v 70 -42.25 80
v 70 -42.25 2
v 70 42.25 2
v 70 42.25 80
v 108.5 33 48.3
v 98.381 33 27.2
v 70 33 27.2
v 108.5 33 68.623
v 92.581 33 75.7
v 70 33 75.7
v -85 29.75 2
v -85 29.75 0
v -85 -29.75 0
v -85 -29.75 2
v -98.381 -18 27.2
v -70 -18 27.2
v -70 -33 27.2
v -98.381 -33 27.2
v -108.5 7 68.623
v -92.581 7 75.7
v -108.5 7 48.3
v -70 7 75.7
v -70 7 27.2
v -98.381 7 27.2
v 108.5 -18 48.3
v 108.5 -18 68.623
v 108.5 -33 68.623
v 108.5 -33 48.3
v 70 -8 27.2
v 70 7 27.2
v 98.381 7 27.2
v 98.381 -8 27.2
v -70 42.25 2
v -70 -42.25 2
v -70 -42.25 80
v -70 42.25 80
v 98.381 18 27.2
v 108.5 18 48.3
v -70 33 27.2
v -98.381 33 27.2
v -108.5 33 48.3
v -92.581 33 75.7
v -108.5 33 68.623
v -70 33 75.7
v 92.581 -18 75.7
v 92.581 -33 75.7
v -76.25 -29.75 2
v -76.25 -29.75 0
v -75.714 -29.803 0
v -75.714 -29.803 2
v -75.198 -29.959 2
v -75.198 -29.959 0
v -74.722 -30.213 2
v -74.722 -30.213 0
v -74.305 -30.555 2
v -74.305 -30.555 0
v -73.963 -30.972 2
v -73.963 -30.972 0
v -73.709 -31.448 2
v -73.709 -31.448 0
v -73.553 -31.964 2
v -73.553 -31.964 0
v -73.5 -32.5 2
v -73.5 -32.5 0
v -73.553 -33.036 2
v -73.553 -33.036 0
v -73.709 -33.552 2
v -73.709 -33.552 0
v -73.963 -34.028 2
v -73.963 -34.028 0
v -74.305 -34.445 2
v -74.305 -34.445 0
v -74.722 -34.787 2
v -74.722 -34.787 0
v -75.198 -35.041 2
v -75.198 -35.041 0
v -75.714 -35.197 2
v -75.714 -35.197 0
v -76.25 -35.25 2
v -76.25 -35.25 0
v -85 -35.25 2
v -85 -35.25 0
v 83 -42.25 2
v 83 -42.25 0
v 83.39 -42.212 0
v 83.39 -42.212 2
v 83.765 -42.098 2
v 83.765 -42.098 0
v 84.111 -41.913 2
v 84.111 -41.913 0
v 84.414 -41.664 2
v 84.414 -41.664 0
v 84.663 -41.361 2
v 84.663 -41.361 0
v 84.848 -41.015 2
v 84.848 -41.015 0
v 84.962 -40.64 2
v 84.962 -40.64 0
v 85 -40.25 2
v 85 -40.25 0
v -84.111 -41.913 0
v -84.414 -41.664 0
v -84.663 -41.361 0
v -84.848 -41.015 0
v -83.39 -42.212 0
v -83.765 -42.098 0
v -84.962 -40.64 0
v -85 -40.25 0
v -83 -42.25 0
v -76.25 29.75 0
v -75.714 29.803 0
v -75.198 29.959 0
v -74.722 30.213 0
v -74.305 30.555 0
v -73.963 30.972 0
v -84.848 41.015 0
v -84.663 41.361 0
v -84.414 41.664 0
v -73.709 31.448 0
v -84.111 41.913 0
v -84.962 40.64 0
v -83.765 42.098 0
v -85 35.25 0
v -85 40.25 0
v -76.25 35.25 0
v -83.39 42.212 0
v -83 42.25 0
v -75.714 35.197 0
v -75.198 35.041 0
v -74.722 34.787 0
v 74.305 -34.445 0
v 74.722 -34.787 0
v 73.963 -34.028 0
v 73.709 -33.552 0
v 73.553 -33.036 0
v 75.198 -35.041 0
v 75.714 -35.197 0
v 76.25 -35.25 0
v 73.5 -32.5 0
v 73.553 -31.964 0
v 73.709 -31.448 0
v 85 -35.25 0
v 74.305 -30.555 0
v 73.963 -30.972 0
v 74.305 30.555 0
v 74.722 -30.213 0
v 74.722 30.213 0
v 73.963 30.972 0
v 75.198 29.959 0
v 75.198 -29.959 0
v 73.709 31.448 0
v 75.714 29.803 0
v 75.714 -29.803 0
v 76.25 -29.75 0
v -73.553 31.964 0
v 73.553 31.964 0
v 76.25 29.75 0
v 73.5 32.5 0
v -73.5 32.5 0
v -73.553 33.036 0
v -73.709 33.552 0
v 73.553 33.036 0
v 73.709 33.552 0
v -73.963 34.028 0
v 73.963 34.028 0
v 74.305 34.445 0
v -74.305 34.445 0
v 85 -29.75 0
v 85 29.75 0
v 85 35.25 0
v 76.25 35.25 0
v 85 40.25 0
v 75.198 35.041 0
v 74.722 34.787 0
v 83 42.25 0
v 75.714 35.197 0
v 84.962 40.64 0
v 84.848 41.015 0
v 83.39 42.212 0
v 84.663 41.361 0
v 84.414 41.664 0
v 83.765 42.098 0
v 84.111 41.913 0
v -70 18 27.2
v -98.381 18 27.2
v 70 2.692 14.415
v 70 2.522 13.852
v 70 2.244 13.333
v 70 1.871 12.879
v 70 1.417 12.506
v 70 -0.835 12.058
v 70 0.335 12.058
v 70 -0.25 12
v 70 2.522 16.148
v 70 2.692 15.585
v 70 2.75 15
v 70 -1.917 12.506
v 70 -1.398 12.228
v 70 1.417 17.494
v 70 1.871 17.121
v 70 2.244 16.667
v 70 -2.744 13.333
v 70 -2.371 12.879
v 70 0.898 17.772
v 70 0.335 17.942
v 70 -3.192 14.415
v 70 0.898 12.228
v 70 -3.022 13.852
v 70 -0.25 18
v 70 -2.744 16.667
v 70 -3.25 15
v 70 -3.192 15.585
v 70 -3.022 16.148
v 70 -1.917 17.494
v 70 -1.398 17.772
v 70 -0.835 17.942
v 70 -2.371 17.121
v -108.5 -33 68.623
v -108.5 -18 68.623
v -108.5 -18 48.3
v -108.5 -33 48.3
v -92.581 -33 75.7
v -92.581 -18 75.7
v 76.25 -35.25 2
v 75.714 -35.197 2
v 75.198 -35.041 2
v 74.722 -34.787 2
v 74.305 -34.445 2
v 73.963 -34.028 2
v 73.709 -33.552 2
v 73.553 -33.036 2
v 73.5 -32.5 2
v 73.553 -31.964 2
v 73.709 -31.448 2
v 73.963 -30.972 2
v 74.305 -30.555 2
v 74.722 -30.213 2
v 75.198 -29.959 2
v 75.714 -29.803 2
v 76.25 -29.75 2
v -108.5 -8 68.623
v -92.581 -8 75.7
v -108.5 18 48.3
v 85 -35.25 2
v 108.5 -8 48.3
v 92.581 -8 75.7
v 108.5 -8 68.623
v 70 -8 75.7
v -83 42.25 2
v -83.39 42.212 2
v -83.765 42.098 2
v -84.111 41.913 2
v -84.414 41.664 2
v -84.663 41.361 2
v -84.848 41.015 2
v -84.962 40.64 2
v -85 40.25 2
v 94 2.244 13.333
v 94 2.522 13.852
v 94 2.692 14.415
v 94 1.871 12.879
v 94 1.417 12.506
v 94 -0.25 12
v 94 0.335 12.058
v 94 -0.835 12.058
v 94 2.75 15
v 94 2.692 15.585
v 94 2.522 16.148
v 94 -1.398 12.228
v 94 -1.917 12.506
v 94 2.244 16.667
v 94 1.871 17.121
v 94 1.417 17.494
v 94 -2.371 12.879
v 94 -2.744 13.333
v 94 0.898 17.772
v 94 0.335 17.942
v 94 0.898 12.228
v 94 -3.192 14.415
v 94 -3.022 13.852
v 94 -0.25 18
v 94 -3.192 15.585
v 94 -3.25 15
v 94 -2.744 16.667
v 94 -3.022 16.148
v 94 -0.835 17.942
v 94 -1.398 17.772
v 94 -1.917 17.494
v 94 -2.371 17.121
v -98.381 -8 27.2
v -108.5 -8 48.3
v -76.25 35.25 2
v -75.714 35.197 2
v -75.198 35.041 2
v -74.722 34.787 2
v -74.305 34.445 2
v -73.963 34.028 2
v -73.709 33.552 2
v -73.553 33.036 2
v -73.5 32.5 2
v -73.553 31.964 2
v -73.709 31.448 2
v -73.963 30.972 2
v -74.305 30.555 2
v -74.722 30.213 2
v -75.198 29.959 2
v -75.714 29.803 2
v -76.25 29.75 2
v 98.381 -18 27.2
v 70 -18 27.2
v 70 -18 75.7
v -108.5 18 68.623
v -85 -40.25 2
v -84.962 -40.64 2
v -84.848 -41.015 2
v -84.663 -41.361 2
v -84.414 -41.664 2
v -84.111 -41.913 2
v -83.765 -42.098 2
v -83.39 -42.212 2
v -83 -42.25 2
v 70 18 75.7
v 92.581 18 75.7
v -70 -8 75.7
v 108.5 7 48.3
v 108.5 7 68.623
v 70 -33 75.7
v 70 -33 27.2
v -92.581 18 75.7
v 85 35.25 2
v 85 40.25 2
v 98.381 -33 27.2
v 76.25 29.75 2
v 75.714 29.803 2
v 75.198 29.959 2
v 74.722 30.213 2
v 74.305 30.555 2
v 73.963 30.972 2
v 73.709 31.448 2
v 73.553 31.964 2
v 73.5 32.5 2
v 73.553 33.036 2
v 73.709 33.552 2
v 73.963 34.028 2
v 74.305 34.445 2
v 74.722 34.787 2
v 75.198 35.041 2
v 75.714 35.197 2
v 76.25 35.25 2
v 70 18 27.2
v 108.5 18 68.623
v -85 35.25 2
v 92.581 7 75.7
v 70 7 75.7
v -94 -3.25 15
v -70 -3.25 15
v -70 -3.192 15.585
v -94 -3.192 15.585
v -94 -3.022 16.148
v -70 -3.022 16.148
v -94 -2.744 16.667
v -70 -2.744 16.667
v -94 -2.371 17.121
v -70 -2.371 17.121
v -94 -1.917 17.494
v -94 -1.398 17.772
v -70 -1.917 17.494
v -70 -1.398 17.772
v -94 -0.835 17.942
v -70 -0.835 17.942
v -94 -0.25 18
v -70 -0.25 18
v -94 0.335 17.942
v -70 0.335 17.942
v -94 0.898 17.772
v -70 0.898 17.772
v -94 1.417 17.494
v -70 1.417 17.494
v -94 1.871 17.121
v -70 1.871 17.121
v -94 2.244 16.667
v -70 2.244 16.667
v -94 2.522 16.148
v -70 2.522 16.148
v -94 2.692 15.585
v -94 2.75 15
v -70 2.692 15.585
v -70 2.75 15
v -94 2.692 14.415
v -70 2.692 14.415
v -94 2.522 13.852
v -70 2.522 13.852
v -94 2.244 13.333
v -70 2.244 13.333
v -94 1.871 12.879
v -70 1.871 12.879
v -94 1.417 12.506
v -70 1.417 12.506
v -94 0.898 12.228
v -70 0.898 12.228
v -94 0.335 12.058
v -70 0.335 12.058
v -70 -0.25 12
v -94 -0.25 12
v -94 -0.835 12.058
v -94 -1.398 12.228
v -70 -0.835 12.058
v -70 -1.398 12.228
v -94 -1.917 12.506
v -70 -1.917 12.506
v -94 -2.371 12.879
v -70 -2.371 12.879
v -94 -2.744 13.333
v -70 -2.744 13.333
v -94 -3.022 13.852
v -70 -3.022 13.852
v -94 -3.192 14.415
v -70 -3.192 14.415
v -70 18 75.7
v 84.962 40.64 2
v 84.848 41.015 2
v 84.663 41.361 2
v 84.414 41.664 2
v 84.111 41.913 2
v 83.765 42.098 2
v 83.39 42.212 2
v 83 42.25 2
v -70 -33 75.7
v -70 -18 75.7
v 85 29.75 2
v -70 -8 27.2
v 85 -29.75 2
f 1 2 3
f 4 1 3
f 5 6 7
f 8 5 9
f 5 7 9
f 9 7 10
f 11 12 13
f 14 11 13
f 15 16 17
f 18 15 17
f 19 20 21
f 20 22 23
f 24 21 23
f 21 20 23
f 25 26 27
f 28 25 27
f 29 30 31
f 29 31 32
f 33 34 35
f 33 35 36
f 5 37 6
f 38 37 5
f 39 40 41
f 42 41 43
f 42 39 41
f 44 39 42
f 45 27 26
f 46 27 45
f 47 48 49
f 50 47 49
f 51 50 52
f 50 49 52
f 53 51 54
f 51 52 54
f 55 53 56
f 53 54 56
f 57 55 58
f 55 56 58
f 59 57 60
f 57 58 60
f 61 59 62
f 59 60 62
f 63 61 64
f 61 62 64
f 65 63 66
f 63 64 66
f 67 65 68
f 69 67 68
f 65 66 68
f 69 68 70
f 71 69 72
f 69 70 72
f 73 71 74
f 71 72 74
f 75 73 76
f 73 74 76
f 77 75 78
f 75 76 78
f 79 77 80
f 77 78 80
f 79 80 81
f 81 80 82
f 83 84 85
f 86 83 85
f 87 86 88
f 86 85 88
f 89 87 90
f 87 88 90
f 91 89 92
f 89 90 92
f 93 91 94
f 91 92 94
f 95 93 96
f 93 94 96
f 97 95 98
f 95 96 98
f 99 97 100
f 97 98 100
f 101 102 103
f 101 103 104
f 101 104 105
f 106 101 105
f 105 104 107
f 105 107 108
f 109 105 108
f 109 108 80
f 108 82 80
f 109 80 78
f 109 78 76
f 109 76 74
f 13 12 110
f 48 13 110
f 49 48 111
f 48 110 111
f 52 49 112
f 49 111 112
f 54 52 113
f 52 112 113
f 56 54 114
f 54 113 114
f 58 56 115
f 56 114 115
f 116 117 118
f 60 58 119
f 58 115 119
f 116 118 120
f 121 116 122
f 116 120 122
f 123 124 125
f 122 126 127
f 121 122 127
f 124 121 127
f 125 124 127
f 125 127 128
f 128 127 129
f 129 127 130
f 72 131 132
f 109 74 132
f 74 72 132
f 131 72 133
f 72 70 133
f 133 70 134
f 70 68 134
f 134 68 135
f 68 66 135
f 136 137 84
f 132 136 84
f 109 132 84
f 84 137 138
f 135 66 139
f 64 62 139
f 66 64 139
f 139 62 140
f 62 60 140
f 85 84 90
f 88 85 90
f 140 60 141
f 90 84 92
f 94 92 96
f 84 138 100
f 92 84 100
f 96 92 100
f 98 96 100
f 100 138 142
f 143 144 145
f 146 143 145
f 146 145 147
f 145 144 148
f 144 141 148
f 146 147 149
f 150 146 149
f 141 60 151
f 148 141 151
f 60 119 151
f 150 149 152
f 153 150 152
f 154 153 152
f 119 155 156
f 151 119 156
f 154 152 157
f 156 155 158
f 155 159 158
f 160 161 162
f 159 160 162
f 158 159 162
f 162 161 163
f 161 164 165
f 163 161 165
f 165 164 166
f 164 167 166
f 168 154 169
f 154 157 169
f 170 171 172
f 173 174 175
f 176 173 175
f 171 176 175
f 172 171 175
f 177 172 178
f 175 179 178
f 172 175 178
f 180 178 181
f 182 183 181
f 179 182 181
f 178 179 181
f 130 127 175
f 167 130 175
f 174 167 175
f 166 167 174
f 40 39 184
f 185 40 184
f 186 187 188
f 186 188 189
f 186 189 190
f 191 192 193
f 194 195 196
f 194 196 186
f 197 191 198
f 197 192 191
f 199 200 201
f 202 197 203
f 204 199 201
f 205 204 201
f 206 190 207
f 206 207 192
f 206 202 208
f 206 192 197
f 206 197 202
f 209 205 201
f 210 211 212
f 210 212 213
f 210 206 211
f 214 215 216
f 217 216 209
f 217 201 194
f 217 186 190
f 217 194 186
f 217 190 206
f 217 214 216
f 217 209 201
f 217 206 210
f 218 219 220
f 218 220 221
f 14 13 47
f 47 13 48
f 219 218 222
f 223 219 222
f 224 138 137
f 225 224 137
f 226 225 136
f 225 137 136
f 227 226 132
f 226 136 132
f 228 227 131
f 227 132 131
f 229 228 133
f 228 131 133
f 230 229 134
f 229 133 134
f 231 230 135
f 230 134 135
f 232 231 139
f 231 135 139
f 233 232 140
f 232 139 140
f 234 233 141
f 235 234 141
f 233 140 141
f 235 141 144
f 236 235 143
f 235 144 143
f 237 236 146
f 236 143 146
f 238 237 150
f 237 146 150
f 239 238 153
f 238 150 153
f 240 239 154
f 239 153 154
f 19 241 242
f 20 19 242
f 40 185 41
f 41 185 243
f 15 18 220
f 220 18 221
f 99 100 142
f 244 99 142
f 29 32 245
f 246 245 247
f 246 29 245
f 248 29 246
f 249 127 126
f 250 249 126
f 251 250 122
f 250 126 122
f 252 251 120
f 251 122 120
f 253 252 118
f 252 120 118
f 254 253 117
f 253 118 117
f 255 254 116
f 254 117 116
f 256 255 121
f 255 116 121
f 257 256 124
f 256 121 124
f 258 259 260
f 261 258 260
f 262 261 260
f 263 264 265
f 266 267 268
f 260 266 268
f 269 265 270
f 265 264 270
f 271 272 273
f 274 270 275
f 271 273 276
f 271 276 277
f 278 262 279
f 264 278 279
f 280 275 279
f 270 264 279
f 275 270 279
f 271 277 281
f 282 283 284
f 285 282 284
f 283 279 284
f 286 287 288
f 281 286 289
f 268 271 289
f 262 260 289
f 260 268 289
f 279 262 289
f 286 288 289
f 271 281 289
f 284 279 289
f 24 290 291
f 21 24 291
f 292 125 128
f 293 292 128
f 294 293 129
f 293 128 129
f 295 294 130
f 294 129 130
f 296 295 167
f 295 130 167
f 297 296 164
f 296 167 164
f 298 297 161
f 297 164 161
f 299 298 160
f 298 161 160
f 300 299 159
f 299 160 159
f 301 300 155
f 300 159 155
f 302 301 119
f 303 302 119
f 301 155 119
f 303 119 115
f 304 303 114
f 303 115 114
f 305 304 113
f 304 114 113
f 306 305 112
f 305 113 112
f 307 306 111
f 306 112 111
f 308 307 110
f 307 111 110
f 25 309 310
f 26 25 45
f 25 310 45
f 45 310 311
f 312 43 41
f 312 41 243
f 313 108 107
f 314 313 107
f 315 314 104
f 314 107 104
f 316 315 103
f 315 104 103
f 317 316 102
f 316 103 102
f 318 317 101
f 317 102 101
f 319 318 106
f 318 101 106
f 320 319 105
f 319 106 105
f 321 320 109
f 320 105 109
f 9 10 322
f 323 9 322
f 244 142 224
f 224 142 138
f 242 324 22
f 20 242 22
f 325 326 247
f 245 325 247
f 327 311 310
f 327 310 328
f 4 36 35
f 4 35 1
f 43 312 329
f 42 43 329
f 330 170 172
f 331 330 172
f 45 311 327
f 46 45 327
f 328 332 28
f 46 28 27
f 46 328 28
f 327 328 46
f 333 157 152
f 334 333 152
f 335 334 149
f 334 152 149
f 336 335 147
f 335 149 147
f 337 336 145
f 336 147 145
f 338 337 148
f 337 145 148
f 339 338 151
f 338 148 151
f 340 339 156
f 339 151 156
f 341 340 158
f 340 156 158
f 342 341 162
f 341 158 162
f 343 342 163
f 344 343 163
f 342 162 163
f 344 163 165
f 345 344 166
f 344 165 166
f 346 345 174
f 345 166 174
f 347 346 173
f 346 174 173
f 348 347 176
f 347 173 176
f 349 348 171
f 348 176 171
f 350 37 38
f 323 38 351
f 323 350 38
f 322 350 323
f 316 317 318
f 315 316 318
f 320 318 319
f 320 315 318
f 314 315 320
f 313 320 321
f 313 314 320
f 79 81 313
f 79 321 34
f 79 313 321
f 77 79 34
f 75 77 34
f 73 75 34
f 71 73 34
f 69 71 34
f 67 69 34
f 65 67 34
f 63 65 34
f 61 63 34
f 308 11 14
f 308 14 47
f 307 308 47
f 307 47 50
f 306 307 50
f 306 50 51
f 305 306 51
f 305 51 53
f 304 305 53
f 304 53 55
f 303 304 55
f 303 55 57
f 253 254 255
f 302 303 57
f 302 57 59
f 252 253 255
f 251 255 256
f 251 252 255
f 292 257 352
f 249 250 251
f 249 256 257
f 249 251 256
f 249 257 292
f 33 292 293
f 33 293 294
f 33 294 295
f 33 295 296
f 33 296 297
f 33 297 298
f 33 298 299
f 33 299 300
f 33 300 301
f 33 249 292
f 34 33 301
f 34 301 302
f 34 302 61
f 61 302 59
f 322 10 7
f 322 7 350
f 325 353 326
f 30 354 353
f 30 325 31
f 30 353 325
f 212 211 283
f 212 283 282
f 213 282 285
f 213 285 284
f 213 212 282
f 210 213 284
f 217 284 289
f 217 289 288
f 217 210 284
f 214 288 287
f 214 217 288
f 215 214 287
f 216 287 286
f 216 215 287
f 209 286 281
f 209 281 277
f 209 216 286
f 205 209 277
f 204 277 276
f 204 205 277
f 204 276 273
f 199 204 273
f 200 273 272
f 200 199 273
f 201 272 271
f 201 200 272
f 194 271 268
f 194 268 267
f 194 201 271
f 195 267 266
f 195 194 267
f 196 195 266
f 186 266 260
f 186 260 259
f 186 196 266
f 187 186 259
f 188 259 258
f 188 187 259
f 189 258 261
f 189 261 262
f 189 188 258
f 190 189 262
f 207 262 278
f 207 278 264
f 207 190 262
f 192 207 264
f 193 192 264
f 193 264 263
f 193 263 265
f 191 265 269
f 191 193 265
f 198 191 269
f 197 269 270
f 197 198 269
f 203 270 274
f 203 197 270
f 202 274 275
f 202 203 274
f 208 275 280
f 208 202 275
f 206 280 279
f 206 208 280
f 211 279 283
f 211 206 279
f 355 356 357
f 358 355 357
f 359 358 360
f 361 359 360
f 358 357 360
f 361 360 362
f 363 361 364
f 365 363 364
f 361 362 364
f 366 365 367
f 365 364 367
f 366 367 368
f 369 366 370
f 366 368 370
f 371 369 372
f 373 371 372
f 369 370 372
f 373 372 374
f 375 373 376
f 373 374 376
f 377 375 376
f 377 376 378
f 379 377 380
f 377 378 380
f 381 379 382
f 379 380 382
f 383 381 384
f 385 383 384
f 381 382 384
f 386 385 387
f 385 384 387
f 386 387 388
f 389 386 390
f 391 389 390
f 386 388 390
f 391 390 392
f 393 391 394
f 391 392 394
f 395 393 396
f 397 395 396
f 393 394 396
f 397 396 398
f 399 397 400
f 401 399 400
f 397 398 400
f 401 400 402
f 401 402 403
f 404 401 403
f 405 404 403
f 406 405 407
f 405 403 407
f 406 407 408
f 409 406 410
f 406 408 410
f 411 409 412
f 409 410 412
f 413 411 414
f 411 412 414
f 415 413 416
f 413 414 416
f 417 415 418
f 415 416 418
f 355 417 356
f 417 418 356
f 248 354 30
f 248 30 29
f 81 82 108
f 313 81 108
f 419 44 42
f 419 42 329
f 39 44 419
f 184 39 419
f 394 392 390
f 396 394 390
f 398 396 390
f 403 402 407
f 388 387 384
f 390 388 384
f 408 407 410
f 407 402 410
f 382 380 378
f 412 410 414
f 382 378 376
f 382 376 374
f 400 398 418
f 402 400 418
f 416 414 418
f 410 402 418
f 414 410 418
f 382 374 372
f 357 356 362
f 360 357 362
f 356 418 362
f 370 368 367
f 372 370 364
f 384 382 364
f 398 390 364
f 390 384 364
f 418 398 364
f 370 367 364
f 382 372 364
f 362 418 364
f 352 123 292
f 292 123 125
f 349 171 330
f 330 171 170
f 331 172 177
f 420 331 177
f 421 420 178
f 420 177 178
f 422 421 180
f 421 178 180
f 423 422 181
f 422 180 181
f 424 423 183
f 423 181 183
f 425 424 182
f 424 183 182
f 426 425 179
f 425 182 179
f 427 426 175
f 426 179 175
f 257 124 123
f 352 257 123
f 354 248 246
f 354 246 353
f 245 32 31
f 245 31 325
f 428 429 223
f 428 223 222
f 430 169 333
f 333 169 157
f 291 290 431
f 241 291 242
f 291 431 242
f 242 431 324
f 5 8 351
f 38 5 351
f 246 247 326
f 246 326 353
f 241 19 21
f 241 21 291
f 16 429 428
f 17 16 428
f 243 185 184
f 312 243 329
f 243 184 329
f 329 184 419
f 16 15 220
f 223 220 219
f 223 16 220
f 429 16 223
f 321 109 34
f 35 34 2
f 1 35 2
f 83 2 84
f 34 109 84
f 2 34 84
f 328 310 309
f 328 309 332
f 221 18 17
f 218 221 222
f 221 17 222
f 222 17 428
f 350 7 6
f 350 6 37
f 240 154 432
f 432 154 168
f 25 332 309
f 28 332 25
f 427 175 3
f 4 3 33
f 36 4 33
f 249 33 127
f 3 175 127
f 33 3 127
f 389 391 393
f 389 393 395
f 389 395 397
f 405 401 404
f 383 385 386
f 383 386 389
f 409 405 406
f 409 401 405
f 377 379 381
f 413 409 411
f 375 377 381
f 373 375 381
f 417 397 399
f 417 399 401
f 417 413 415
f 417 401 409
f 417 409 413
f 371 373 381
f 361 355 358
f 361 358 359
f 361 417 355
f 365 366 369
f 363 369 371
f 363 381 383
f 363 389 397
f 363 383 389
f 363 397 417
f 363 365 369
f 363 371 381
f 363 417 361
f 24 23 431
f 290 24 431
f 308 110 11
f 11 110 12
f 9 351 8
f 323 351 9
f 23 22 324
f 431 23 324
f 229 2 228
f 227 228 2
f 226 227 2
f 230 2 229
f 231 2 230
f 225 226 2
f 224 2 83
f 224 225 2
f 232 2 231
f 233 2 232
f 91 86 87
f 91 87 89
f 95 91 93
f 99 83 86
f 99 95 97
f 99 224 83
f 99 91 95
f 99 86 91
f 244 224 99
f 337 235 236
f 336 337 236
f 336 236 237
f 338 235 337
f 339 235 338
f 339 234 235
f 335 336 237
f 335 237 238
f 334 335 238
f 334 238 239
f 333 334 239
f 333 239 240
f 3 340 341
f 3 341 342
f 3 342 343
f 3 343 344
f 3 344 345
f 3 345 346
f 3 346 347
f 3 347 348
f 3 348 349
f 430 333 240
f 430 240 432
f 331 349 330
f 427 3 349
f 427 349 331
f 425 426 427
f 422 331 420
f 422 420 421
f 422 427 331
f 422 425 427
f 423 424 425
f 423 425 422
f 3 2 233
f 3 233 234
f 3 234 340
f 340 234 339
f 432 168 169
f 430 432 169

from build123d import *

# Parameters (mm, degrees)
F1_DEPTH = 2
F2_W     = 140
F2_H     = 84.5
F3_DEPTH = 78
F4_W     = 15
F4_H     = 48.5
F5_DEPTH = 38.5
F7_DEPTH = 200
F8_R     = 3
F9_DEPTH = 24


with BuildPart() as f1:
    # F0 (on Top) → F1 (new body)
    with BuildSketch(Plane.XY):
        with BuildLine():
            ThreePointArc((85, 40.25), (84.414214, 41.664214), (83, 42.25))
            Line((83, 42.25), (-83, 42.25))
            ThreePointArc((-83, 42.25), (-84.414214, 41.664214), (-85, 40.25))
            Line((-85, 40.25), (-85, 35.25))
            Line((-85, 35.25), (-76.25, 35.25))
            ThreePointArc((-76.25, 35.25), (-73.5, 32.5), (-76.25, 29.75))
            Line((-76.25, 29.75), (-85, 29.75))
            Line((-85, 29.75), (-85, -29.75))
            Line((-85, -29.75), (-76.25, -29.75))
            ThreePointArc((-76.25, -29.75), (-73.5, -32.5), (-76.25, -35.25))
            Line((-76.25, -35.25), (-85, -35.25))
            Line((-85, -35.25), (-85, -40.25))
            ThreePointArc((-85, -40.25), (-84.414214, -41.664214), (-83, -42.25))
            Line((-83, -42.25), (83, -42.25))
            ThreePointArc((83, -42.25), (84.414214, -41.664214), (85, -40.25))
            Line((85, -40.25), (85, -35.25))
            Line((85, -35.25), (76.25, -35.25))
            ThreePointArc((76.25, -35.25), (73.5, -32.5), (76.25, -29.75))
            Line((76.25, -29.75), (85, -29.75))
            Line((85, -29.75), (85, 29.75))
            Line((85, 29.75), (76.25, 29.75))
            ThreePointArc((76.25, 29.75), (73.5, 32.5), (76.25, 35.25))
            Line((76.25, 35.25), (85, 35.25))
            Line((85, 35.25), (85, 40.25))
        make_face()
    extrude(amount=F1_DEPTH)

    # F2 (on face) → F3 (join)
    with BuildSketch(Plane.XY.offset(2)):
        Rectangle(F2_W, F2_H)
    extrude(amount=F3_DEPTH)


with BuildPart() as f5:
    # F4 (on face) → F5 (new body)
    with BuildSketch(Plane(origin=(-70, 0, 0), x_dir=(0, -1, 0), z_dir=(-1, 0, 0))):
        with Locations((-25.5, 51.45)):
            Rectangle(F4_W, F4_H)
        Polygon((7, 75.7), (-7, 75.7), (-7, 27.2), (7, 27.2), (8, 27.2), (8, 75.7), align=None)
        with Locations((25.5, 51.45)):
            Rectangle(F4_W, F4_H)
    extrude(amount=F5_DEPTH)

    # F6 (on face) → F7 (cut)
    with BuildSketch(Plane.XZ.offset(33)):
        Polygon((-108.5, 48.299946), (-108.5, 68.622813), (-92.581049, 75.7), (-156.796485, 106.618979), (-183.457196, 103.239452), (-183.457196, 0), (-98.381154, 27.2), align=None)
    extrude(amount=-F7_DEPTH, mode=Mode.SUBTRACT)


with BuildPart() as f9:
    # F8 (on face) → F9 (new body)
    with BuildSketch(Plane(origin=(-70, 0, 0), x_dir=(0, -1, 0), z_dir=(-1, 0, 0))):
        with Locations((0.25, 15)):
            Circle(F8_R)
    extrude(amount=F9_DEPTH)


with BuildPart() as f10_1:
    # F10: instance of F5
    add(f5.part.mirror(Plane.YZ))


with BuildPart() as f10_2:
    # F10: instance of F9
    add(f9.part.mirror(Plane.YZ))


solid = Compound([f1.part, f5.part, f9.part, f10_1.part, f10_2.part])
